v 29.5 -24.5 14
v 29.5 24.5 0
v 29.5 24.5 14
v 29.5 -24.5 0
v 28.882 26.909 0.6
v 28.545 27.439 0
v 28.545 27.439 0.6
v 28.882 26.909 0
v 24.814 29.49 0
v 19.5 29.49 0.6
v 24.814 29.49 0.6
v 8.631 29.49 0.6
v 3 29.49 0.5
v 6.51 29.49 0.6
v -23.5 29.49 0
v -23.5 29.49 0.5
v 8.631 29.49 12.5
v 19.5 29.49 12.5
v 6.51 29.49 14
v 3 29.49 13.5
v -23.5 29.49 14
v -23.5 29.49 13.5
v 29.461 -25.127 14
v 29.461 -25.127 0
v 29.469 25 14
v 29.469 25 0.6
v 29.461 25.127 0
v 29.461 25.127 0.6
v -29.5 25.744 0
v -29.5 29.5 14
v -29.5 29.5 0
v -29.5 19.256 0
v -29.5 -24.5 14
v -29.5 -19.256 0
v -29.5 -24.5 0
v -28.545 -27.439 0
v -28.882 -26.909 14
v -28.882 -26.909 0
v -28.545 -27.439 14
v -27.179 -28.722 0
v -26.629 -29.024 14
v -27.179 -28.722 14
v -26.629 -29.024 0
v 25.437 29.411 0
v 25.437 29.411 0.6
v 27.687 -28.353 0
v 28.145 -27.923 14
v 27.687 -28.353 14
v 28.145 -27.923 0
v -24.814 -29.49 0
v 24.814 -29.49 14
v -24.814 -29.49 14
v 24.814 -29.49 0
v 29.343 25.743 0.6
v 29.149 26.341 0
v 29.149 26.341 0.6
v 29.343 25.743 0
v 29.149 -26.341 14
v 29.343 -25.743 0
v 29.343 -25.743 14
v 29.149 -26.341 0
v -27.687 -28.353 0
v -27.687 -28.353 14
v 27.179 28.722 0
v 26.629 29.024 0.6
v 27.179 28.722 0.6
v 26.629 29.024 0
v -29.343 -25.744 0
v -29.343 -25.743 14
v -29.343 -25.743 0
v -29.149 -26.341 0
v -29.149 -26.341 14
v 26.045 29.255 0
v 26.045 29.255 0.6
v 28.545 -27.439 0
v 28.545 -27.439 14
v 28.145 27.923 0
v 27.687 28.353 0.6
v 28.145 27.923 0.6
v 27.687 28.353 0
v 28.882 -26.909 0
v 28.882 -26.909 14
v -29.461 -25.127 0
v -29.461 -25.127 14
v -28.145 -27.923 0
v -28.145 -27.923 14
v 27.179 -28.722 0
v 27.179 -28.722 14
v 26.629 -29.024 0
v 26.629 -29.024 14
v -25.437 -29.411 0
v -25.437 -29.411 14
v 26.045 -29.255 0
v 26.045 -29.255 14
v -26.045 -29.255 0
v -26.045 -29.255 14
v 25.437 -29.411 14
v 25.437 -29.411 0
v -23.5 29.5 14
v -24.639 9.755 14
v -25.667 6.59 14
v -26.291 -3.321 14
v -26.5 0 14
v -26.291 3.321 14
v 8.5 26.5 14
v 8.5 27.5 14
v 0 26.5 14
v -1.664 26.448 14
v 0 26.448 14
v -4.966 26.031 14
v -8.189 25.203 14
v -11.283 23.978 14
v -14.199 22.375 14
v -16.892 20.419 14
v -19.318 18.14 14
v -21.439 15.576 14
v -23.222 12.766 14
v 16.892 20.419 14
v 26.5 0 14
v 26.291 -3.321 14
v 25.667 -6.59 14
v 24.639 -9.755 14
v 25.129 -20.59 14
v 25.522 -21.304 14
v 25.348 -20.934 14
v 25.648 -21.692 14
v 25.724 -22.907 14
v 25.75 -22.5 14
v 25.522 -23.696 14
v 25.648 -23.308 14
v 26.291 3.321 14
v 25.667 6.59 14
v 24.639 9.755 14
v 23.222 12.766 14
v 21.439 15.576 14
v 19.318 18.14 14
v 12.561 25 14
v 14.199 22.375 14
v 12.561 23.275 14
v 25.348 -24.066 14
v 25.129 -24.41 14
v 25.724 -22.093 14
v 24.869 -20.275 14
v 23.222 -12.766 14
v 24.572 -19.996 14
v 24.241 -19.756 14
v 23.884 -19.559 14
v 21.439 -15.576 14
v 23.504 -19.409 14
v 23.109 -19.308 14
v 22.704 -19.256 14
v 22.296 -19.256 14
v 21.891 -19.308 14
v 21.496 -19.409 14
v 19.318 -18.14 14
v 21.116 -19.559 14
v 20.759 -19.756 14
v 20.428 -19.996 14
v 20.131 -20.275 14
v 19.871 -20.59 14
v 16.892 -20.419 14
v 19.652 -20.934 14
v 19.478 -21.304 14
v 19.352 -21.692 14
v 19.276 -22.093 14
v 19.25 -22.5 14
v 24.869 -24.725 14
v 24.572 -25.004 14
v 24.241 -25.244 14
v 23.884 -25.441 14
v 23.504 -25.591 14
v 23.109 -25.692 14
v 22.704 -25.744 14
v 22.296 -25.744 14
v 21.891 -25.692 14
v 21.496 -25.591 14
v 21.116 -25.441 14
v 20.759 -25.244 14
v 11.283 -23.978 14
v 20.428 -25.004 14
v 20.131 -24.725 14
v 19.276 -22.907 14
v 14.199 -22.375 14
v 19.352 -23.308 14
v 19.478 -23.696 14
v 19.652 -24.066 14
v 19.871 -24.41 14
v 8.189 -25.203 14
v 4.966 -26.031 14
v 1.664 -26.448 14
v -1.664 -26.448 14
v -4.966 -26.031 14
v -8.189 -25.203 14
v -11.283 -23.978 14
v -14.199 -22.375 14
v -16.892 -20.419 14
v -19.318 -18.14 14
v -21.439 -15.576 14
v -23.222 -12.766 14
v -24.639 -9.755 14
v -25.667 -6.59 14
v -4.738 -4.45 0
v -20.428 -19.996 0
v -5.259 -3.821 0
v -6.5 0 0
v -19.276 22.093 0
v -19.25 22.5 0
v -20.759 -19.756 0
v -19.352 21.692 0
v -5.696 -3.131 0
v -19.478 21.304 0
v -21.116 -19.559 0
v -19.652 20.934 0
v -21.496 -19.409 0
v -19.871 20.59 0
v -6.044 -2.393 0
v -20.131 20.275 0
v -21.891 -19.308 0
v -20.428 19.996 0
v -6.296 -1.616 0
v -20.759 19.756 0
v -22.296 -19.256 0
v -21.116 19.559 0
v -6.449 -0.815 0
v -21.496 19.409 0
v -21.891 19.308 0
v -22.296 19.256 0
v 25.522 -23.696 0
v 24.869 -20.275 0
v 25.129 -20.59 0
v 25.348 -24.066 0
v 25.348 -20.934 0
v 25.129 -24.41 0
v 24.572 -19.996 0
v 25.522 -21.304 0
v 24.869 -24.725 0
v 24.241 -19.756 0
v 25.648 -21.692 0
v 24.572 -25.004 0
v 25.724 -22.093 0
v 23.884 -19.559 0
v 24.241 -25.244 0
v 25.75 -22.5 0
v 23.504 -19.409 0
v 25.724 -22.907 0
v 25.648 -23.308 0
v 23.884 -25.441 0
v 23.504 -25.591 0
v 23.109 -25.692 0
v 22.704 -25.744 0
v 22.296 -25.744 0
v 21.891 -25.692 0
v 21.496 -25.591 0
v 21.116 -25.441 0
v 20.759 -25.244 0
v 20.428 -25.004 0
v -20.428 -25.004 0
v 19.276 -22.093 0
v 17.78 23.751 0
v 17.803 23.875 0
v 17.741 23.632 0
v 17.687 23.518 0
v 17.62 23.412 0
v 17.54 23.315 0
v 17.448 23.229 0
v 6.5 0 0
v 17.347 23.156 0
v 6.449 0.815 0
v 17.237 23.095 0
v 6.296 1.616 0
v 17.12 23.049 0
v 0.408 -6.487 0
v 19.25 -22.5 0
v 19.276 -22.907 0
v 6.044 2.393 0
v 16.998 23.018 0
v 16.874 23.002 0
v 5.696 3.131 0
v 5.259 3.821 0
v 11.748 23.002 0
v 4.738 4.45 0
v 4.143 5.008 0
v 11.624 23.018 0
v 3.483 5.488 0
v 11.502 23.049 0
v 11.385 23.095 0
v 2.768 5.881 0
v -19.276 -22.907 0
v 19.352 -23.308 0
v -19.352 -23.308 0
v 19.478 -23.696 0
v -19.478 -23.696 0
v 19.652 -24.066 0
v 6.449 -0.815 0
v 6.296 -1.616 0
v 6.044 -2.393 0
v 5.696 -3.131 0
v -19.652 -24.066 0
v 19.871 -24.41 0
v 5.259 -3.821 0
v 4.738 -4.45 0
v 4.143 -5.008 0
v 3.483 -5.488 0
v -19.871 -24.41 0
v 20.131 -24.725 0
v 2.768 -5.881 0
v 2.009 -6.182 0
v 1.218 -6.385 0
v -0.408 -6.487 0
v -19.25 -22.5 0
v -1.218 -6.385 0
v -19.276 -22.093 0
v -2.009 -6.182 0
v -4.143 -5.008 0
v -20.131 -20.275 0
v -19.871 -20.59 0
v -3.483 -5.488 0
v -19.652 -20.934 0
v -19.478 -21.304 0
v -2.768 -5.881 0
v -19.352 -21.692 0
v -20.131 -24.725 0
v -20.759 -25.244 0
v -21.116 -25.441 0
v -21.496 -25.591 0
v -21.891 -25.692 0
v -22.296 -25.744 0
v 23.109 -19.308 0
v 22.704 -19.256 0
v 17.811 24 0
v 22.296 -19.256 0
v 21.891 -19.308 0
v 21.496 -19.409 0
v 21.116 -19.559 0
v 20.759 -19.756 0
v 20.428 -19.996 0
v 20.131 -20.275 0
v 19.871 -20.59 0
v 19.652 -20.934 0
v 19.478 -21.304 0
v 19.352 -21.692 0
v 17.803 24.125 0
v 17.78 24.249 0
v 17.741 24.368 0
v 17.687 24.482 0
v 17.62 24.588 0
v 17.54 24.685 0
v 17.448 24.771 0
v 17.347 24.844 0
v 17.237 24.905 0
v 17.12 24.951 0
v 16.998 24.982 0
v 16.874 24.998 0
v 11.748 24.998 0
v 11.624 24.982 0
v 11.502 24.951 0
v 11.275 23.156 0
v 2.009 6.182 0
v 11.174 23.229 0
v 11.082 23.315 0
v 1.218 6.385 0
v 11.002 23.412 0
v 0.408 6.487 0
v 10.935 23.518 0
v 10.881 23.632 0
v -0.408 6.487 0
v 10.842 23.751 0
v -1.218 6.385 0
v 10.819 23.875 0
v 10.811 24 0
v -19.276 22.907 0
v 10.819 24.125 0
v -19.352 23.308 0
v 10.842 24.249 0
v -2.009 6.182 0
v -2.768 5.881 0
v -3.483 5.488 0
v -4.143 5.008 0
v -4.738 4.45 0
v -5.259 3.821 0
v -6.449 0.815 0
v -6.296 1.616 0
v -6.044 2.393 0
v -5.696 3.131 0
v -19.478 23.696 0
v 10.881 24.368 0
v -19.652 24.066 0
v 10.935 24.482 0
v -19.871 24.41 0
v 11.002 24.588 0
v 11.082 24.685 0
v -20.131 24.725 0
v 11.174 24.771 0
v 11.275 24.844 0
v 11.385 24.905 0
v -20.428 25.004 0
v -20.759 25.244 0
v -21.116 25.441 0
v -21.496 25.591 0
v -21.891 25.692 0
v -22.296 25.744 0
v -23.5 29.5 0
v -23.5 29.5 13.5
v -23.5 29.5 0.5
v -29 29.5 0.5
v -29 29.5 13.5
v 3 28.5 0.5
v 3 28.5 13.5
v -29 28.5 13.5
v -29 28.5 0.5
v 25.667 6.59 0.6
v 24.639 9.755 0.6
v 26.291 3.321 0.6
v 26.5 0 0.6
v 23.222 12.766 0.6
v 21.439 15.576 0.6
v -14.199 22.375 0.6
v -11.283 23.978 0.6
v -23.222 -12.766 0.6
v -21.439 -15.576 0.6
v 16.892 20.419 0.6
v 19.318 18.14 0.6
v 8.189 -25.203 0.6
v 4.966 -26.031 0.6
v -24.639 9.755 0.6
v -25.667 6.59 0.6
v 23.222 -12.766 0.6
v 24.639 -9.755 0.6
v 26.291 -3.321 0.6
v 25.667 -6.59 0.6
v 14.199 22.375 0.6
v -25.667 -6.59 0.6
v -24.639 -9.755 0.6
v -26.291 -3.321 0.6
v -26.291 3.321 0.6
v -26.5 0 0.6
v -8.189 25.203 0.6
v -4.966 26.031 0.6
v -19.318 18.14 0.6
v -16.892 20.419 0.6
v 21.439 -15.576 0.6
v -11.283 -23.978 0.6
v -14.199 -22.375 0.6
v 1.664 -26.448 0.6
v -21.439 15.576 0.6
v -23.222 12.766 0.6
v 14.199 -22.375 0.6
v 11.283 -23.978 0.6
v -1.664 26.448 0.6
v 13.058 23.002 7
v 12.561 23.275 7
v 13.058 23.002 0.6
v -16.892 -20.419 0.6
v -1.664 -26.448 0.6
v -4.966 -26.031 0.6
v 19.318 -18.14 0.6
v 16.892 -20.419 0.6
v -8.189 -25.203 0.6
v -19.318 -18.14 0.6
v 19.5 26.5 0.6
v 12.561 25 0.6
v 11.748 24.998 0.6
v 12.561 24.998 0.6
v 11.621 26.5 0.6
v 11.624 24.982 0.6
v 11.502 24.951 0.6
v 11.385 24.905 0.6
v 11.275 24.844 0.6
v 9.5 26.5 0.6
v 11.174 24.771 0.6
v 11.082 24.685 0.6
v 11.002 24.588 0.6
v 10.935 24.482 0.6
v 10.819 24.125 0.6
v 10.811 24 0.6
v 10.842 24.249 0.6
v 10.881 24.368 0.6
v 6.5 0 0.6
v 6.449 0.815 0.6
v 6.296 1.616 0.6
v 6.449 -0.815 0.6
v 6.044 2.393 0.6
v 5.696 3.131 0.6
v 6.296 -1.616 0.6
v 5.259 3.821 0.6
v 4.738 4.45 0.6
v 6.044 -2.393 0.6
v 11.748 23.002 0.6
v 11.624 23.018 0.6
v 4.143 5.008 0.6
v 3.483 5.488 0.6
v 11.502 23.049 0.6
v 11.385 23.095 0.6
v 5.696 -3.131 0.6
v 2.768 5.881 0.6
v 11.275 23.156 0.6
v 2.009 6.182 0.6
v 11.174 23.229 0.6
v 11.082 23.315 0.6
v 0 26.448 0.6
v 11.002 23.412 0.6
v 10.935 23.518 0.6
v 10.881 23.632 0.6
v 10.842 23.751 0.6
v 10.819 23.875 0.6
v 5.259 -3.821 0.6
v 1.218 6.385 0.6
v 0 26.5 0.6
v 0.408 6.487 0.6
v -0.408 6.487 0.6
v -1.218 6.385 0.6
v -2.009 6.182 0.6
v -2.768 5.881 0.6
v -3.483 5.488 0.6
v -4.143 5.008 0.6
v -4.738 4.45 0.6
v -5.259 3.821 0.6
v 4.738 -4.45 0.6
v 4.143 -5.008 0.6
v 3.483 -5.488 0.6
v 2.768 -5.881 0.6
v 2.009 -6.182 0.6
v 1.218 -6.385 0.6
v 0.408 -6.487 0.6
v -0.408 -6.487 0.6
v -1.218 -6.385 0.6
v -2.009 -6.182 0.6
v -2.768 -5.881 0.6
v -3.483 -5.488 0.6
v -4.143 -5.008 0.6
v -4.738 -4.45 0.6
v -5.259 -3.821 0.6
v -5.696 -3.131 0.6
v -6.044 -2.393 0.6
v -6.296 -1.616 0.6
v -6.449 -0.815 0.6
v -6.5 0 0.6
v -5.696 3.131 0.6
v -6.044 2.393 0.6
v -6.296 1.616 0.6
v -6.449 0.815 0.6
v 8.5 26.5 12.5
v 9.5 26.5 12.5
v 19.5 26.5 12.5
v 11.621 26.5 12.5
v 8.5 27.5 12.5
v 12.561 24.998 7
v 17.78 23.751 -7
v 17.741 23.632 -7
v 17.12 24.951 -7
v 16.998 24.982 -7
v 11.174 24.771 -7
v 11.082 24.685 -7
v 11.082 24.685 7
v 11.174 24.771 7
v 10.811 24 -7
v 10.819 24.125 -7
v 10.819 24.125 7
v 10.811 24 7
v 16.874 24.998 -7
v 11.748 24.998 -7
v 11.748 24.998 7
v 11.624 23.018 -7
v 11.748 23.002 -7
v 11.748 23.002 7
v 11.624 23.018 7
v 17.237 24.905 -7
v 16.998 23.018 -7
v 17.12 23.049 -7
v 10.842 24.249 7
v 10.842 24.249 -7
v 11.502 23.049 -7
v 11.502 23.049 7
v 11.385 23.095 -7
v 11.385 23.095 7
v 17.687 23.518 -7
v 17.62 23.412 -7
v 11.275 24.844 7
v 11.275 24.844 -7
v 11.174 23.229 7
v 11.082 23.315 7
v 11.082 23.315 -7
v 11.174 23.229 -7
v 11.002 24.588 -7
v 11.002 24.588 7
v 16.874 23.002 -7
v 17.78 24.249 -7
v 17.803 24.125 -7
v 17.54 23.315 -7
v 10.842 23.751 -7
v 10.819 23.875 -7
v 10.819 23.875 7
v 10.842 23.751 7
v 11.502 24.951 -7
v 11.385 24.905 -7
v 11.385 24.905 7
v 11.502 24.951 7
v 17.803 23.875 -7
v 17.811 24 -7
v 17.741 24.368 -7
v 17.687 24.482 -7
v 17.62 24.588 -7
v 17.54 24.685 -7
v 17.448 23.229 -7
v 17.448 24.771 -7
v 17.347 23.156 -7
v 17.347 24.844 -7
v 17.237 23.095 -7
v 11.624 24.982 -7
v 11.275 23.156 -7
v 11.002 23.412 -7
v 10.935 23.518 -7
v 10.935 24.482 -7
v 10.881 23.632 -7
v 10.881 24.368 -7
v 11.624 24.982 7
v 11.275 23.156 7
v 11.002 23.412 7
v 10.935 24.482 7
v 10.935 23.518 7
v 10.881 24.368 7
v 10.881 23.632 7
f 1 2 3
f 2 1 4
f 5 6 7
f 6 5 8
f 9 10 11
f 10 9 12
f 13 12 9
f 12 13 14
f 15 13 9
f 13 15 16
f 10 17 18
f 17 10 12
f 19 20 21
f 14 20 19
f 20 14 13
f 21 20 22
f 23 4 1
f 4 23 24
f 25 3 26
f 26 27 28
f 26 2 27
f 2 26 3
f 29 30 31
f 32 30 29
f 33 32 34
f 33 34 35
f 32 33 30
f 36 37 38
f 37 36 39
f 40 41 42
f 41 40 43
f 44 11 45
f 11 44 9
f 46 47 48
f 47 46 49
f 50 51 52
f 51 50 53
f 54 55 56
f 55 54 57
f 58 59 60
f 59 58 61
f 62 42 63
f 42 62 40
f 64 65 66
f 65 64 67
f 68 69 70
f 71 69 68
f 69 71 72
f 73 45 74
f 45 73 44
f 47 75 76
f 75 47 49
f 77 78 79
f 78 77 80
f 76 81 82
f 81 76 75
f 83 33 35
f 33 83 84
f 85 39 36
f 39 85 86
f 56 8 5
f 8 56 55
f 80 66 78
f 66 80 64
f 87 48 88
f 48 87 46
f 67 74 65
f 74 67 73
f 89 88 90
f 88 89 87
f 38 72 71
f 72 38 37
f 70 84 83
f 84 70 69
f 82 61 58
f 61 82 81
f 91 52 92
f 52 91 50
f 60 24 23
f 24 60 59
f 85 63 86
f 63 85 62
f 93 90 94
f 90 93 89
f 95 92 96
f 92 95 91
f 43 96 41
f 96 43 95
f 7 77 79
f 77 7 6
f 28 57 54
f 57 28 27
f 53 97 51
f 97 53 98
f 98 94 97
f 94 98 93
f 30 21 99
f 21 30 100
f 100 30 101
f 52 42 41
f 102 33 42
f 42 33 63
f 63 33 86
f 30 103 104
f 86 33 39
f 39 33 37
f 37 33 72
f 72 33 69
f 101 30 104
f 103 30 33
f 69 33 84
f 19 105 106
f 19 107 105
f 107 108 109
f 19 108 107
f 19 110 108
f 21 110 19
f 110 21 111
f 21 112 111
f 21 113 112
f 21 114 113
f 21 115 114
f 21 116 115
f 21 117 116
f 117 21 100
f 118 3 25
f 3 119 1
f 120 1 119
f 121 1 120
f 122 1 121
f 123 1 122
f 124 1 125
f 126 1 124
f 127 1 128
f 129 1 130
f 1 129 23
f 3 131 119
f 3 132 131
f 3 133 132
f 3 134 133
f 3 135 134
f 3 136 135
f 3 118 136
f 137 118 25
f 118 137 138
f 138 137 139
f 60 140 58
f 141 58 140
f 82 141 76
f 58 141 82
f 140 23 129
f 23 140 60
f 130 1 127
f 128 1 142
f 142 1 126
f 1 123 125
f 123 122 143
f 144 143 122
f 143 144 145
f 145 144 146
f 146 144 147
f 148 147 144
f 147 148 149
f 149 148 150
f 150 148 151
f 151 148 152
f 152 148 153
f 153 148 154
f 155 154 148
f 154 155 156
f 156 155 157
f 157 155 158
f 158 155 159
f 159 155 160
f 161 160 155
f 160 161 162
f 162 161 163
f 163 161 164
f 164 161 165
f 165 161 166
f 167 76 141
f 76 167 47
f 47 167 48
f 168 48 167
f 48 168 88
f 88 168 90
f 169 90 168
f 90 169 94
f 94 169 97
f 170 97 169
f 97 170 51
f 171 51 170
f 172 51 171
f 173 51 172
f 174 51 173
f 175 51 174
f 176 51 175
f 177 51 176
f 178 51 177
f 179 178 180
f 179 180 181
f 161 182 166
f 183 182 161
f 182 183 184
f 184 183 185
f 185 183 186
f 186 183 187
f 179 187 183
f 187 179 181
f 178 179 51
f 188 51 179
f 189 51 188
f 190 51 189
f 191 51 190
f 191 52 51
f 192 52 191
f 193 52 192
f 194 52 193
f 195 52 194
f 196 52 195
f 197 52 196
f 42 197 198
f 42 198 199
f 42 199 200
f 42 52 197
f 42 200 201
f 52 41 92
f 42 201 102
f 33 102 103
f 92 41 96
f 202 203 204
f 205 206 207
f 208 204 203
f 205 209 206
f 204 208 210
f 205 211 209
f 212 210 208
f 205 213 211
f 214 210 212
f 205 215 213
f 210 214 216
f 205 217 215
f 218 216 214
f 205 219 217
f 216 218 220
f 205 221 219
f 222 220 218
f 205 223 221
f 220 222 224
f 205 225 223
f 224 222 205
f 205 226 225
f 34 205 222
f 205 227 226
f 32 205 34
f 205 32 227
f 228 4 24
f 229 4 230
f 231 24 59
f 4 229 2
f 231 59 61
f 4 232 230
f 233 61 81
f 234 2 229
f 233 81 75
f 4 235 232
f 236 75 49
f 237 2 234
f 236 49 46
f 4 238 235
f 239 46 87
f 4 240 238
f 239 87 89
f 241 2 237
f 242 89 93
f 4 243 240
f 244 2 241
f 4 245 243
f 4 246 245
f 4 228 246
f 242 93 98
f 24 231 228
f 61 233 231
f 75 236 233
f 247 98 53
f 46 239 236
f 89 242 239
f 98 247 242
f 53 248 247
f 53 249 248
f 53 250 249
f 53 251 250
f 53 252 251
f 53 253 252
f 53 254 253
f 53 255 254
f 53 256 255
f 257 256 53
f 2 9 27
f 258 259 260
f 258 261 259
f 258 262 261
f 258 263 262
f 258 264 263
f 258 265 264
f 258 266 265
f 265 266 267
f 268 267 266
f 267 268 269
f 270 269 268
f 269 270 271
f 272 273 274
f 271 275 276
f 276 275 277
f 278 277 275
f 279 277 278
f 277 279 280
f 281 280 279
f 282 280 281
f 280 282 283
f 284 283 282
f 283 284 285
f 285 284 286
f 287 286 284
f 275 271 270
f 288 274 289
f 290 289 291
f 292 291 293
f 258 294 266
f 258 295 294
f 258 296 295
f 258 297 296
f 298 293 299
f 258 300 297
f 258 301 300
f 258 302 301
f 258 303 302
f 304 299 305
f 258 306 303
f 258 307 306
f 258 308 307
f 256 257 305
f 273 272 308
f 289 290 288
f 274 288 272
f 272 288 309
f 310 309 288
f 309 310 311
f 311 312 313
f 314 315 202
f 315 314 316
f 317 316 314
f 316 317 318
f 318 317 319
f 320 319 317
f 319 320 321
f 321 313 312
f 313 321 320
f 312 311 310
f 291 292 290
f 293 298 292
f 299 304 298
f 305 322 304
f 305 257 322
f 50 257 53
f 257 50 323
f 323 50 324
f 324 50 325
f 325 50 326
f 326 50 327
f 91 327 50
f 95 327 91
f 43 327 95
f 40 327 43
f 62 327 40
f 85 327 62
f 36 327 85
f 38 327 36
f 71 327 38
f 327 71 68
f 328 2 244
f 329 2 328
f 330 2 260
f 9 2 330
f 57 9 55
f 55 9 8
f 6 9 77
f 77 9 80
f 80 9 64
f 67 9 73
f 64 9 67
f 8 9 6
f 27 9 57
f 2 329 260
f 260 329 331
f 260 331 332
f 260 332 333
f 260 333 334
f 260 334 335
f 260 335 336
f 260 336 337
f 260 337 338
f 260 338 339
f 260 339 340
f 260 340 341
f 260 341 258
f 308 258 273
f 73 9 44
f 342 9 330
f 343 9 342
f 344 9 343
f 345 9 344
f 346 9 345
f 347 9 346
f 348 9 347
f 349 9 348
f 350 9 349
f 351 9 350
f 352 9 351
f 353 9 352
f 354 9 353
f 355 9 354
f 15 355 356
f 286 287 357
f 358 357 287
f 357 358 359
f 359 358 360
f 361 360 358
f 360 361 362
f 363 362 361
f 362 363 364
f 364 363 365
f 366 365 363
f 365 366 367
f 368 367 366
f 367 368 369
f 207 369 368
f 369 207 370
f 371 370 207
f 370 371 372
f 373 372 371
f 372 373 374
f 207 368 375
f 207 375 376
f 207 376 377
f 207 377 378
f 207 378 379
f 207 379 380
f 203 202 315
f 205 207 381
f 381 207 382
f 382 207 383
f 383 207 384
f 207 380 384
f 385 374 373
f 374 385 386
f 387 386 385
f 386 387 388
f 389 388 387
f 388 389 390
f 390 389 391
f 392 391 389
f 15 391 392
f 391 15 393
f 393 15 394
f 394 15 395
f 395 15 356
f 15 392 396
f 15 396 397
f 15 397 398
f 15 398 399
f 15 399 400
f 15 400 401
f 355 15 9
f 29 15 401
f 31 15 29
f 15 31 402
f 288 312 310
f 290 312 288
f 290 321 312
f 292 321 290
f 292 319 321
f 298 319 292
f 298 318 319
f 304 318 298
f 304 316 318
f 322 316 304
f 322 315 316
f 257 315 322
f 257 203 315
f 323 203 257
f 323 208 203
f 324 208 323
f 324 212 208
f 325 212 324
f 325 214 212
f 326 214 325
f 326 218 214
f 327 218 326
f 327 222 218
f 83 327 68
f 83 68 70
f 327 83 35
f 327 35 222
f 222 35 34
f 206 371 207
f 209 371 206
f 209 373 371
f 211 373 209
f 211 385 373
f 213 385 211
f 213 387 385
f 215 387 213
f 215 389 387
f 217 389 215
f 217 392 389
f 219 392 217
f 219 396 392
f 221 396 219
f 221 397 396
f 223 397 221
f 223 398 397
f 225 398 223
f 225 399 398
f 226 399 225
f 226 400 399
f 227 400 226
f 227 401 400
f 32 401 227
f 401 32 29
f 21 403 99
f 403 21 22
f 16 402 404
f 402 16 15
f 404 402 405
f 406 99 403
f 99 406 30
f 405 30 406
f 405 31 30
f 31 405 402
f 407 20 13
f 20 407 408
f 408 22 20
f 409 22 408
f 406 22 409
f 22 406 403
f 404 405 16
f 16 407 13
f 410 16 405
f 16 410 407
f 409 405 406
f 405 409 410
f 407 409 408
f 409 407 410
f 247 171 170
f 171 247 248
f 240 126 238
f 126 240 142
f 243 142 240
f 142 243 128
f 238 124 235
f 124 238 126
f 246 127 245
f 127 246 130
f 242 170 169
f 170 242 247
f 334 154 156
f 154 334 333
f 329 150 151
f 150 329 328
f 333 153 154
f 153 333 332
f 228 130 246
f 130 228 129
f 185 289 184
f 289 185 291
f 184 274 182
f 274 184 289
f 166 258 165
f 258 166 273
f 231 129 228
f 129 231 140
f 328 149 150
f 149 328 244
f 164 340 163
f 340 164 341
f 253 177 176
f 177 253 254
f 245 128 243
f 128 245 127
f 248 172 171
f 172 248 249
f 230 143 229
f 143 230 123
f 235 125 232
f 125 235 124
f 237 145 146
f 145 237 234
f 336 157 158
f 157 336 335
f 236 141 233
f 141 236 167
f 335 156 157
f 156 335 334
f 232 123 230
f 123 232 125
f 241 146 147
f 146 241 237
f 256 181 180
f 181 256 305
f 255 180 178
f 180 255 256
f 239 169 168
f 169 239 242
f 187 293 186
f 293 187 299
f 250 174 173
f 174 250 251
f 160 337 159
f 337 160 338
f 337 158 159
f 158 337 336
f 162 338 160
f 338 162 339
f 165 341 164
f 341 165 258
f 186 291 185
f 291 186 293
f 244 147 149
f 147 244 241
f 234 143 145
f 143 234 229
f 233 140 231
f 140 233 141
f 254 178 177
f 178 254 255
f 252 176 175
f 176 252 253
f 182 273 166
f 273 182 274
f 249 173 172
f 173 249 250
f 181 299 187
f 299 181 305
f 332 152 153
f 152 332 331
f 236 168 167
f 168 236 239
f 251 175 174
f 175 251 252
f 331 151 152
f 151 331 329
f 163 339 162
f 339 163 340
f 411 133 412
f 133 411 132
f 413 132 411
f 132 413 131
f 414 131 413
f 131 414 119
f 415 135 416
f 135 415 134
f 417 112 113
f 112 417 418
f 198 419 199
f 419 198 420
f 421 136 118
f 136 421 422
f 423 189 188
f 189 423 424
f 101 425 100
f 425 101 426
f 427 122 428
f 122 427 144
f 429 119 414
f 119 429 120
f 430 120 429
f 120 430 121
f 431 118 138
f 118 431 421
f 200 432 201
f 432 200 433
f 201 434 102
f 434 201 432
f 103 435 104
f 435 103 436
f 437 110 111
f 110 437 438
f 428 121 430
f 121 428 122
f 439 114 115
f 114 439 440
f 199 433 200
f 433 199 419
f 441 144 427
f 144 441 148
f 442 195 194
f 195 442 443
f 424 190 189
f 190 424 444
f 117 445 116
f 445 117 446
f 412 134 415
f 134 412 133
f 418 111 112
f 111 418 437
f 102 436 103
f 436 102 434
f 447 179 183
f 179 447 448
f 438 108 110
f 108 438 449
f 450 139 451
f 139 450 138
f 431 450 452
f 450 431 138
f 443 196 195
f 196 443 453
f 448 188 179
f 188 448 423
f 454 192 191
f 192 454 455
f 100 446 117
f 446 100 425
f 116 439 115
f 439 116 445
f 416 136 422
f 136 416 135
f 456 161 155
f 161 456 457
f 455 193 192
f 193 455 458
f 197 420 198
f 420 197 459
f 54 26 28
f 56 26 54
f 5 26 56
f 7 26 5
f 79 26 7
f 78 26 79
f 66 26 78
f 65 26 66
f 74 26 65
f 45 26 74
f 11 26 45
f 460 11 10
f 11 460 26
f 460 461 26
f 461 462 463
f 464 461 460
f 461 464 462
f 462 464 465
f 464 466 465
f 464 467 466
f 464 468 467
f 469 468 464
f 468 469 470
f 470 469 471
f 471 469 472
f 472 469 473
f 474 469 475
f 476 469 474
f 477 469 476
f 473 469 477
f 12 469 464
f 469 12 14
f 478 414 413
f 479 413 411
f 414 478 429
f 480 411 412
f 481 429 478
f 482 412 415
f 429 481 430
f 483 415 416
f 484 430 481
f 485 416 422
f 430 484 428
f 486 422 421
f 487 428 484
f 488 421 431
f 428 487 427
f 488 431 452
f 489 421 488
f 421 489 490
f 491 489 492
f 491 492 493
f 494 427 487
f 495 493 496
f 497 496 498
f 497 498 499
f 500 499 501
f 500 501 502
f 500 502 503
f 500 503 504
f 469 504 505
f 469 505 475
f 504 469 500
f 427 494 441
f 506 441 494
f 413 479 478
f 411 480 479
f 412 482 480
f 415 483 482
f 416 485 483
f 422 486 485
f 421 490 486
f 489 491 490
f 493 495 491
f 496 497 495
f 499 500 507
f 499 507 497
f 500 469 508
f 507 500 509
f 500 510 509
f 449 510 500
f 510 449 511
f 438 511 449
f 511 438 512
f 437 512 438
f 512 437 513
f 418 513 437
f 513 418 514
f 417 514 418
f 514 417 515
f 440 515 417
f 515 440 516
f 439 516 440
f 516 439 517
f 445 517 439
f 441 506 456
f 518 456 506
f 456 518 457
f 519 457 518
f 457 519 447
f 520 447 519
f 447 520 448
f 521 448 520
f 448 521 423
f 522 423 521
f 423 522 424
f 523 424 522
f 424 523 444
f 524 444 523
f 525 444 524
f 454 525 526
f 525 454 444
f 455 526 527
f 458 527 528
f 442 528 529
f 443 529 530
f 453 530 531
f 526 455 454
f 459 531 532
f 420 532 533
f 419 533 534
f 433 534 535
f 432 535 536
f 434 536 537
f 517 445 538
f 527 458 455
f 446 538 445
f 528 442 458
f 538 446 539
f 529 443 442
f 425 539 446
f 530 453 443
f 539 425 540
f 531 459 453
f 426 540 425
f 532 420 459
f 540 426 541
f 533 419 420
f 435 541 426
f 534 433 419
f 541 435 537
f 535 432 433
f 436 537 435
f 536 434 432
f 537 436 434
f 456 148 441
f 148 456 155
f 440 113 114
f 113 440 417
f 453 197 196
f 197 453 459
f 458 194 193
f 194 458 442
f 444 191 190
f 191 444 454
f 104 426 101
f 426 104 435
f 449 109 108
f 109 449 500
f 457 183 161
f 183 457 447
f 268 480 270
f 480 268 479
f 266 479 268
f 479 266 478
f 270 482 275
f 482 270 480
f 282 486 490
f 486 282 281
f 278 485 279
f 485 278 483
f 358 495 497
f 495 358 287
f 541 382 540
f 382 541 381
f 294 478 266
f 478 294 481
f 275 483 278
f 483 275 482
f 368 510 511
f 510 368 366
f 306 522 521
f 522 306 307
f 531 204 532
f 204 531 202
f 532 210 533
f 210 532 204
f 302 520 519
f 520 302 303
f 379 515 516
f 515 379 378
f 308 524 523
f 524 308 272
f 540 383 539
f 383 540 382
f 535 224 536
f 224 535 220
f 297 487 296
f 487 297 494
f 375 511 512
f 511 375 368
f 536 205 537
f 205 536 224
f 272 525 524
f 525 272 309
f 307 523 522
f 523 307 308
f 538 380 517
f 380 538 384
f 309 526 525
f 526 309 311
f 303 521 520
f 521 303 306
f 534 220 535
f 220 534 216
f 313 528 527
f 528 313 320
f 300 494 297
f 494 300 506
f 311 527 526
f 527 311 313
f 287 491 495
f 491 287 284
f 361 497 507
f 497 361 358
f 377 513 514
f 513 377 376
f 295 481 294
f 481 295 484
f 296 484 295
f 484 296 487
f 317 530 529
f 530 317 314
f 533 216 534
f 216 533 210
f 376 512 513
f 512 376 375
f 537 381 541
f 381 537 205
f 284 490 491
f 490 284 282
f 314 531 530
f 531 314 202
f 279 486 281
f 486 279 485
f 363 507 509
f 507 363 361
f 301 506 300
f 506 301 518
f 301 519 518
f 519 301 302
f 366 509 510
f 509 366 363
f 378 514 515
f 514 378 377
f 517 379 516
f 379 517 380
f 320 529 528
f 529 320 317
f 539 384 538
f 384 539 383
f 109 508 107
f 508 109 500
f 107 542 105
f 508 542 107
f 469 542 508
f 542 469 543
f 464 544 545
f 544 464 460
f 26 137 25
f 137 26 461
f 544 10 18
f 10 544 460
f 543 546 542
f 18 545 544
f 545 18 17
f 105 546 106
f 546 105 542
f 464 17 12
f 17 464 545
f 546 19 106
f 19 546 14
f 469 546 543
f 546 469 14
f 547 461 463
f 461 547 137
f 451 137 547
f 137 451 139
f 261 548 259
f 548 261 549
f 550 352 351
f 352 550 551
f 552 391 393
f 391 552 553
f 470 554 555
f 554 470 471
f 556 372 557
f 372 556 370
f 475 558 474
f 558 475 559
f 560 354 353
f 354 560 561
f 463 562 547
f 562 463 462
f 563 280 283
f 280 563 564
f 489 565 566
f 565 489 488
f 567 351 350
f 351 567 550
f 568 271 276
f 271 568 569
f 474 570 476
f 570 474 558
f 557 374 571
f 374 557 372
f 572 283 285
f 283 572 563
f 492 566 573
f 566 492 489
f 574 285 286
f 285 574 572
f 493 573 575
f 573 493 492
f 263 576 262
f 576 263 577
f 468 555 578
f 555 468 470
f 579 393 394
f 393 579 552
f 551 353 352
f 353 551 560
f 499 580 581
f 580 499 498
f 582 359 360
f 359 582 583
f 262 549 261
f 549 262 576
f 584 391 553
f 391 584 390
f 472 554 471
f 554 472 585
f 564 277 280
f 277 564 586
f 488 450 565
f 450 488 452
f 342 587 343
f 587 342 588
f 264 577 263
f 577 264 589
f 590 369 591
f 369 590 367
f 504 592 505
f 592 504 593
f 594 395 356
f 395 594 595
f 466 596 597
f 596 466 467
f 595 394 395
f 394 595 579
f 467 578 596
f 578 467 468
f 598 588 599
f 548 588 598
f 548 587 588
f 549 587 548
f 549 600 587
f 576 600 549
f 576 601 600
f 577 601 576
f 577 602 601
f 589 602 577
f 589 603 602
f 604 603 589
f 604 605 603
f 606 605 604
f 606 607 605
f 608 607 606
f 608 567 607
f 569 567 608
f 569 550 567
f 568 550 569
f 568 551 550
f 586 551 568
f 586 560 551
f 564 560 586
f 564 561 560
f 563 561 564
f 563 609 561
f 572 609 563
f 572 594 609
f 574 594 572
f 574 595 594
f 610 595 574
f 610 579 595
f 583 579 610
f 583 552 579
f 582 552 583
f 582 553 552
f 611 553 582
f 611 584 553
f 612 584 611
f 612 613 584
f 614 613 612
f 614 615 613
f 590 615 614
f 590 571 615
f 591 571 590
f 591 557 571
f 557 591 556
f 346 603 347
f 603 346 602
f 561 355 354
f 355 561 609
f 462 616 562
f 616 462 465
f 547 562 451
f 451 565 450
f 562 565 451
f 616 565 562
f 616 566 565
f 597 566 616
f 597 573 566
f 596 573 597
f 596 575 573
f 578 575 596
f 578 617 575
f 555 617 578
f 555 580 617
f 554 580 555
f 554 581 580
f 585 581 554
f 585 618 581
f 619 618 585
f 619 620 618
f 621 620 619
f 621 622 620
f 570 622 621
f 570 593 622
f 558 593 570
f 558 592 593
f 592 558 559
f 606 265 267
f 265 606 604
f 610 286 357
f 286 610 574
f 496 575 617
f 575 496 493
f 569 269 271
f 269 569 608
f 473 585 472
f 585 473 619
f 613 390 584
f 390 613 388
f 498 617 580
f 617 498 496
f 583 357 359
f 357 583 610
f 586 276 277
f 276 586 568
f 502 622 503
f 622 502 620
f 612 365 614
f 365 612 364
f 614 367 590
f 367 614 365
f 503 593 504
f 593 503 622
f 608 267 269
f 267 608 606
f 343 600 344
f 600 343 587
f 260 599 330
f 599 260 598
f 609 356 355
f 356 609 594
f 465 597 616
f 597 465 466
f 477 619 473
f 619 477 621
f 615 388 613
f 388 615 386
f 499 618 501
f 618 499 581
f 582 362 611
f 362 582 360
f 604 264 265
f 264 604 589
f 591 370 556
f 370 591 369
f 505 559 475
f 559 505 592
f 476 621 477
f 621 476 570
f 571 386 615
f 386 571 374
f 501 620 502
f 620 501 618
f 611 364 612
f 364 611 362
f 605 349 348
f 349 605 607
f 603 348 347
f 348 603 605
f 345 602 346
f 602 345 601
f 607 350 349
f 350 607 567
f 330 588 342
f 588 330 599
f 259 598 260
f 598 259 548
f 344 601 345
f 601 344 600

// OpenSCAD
$fn = 50;


union() {
	difference() {
		union() {
			hull() {
				translate(v = [-24.5000000000, 24.5000000000, 0]) {
					cylinder(h = 14, r = 5);
				}
				translate(v = [24.5000000000, 24.5000000000, 0]) {
					cylinder(h = 14, r = 5);
				}
				translate(v = [-24.5000000000, -24.5000000000, 0]) {
					cylinder(h = 14, r = 5);
				}
				translate(v = [24.5000000000, -24.5000000000, 0]) {
					cylinder(h = 14, r = 5);
				}
			}
			translate(v = [-29.5000000000, 23.5000000000, 0]) {
				cube(size = [6, 6, 14]);
			}
		}
		union() {
			translate(v = [-30.0000000000, -22.5000000000, -250.0000000000]) {
				rotate(a = [0, 0, 0]) {
					difference() {
						union() {
							hull() {
								translate(v = [7.5000000000, 0, 0]) {
									cylinder(h = 250, r = 3.2500000000, r1 = 3.2500000000, r2 = 3.2500000000);
								}
								translate(v = [-7.5000000000, 0, 0]) {
									cylinder(h = 250, r = 3.2500000000, r1 = 3.2500000000, r2 = 3.2500000000);
								}
							}
						}
						union();
					}
				}
			}
			translate(v = [-30.0000000000, 22.5000000000, -250.0000000000]) {
				rotate(a = [0, 0, 0]) {
					difference() {
						union() {
							hull() {
								translate(v = [7.5000000000, 0, 0]) {
									cylinder(h = 250, r = 3.2500000000, r1 = 3.2500000000, r2 = 3.2500000000);
								}
								translate(v = [-7.5000000000, 0, 0]) {
									cylinder(h = 250, r = 3.2500000000, r1 = 3.2500000000, r2 = 3.2500000000);
								}
							}
						}
						union();
					}
				}
			}
			translate(v = [-29.0000000000, 28.5000000000, 0.5000000000]) {
				cube(size = [32, 1, 13.0000000000]);
			}
			translate(v = [22.5000000000, -22.5000000000, 0]) {
				cylinder(h = 100, r = 3.2500000000);
			}
			translate(v = [0, 0, 0.6000000000]) {
				cylinder(h = 16.4000000000, r = 26.5000000000);
			}
			translate(v = [0, 0, -7.0000000000]) {
				cylinder(h = 14, r = 6.5000000000);
			}
			translate(v = [0.0000000000, 25.0000000000, 0.6000000000]) {
				cube(size = [29.5000000000, 1.5000000000, 16.4000000000]);
			}
			translate(v = [19.5000000000, 25.0000000000, 0.6000000000]) {
				cube(size = [10, 4.5000000000, 16.4000000000]);
			}
			translate(v = [8.5000000000, 25.0000000000, 12.5000000000]) {
				cube(size = [21, 4.5000000000, 1.5000000000]);
			}
			translate(v = [5.7500000000, 30.2500000000, 0.6000000000]) {
				rotate(a = [0, 0, -45]) {
					cube(size = [7.5000000000, 1.5000000000, 16.4000000000]);
				}
			}
			translate(v = [5.0610000000, 23.0000000000, 0.6000000000]) {
				cube(size = [7.5000000000, 2, 13.4000000000]);
			}
		}
	}
	union() {
		translate(v = [14.3110000000, 24.0000000000, -7.0000000000]) {
			rotate(a = [0, 0, 0]) {
				difference() {
					union() {
						#hull() {
							#translate(v = [2.5000000000, 0, 0]) {
								cylinder(h = 14, r = 1.0000000000, r1 = 1.0000000000, r2 = 1.0000000000);
							}
							#translate(v = [-2.5000000000, 0, 0]) {
								cylinder(h = 14, r = 1.0000000000, r1 = 1.0000000000, r2 = 1.0000000000);
							}
						}
					}
					union();
				}
			}
		}
	}
}
